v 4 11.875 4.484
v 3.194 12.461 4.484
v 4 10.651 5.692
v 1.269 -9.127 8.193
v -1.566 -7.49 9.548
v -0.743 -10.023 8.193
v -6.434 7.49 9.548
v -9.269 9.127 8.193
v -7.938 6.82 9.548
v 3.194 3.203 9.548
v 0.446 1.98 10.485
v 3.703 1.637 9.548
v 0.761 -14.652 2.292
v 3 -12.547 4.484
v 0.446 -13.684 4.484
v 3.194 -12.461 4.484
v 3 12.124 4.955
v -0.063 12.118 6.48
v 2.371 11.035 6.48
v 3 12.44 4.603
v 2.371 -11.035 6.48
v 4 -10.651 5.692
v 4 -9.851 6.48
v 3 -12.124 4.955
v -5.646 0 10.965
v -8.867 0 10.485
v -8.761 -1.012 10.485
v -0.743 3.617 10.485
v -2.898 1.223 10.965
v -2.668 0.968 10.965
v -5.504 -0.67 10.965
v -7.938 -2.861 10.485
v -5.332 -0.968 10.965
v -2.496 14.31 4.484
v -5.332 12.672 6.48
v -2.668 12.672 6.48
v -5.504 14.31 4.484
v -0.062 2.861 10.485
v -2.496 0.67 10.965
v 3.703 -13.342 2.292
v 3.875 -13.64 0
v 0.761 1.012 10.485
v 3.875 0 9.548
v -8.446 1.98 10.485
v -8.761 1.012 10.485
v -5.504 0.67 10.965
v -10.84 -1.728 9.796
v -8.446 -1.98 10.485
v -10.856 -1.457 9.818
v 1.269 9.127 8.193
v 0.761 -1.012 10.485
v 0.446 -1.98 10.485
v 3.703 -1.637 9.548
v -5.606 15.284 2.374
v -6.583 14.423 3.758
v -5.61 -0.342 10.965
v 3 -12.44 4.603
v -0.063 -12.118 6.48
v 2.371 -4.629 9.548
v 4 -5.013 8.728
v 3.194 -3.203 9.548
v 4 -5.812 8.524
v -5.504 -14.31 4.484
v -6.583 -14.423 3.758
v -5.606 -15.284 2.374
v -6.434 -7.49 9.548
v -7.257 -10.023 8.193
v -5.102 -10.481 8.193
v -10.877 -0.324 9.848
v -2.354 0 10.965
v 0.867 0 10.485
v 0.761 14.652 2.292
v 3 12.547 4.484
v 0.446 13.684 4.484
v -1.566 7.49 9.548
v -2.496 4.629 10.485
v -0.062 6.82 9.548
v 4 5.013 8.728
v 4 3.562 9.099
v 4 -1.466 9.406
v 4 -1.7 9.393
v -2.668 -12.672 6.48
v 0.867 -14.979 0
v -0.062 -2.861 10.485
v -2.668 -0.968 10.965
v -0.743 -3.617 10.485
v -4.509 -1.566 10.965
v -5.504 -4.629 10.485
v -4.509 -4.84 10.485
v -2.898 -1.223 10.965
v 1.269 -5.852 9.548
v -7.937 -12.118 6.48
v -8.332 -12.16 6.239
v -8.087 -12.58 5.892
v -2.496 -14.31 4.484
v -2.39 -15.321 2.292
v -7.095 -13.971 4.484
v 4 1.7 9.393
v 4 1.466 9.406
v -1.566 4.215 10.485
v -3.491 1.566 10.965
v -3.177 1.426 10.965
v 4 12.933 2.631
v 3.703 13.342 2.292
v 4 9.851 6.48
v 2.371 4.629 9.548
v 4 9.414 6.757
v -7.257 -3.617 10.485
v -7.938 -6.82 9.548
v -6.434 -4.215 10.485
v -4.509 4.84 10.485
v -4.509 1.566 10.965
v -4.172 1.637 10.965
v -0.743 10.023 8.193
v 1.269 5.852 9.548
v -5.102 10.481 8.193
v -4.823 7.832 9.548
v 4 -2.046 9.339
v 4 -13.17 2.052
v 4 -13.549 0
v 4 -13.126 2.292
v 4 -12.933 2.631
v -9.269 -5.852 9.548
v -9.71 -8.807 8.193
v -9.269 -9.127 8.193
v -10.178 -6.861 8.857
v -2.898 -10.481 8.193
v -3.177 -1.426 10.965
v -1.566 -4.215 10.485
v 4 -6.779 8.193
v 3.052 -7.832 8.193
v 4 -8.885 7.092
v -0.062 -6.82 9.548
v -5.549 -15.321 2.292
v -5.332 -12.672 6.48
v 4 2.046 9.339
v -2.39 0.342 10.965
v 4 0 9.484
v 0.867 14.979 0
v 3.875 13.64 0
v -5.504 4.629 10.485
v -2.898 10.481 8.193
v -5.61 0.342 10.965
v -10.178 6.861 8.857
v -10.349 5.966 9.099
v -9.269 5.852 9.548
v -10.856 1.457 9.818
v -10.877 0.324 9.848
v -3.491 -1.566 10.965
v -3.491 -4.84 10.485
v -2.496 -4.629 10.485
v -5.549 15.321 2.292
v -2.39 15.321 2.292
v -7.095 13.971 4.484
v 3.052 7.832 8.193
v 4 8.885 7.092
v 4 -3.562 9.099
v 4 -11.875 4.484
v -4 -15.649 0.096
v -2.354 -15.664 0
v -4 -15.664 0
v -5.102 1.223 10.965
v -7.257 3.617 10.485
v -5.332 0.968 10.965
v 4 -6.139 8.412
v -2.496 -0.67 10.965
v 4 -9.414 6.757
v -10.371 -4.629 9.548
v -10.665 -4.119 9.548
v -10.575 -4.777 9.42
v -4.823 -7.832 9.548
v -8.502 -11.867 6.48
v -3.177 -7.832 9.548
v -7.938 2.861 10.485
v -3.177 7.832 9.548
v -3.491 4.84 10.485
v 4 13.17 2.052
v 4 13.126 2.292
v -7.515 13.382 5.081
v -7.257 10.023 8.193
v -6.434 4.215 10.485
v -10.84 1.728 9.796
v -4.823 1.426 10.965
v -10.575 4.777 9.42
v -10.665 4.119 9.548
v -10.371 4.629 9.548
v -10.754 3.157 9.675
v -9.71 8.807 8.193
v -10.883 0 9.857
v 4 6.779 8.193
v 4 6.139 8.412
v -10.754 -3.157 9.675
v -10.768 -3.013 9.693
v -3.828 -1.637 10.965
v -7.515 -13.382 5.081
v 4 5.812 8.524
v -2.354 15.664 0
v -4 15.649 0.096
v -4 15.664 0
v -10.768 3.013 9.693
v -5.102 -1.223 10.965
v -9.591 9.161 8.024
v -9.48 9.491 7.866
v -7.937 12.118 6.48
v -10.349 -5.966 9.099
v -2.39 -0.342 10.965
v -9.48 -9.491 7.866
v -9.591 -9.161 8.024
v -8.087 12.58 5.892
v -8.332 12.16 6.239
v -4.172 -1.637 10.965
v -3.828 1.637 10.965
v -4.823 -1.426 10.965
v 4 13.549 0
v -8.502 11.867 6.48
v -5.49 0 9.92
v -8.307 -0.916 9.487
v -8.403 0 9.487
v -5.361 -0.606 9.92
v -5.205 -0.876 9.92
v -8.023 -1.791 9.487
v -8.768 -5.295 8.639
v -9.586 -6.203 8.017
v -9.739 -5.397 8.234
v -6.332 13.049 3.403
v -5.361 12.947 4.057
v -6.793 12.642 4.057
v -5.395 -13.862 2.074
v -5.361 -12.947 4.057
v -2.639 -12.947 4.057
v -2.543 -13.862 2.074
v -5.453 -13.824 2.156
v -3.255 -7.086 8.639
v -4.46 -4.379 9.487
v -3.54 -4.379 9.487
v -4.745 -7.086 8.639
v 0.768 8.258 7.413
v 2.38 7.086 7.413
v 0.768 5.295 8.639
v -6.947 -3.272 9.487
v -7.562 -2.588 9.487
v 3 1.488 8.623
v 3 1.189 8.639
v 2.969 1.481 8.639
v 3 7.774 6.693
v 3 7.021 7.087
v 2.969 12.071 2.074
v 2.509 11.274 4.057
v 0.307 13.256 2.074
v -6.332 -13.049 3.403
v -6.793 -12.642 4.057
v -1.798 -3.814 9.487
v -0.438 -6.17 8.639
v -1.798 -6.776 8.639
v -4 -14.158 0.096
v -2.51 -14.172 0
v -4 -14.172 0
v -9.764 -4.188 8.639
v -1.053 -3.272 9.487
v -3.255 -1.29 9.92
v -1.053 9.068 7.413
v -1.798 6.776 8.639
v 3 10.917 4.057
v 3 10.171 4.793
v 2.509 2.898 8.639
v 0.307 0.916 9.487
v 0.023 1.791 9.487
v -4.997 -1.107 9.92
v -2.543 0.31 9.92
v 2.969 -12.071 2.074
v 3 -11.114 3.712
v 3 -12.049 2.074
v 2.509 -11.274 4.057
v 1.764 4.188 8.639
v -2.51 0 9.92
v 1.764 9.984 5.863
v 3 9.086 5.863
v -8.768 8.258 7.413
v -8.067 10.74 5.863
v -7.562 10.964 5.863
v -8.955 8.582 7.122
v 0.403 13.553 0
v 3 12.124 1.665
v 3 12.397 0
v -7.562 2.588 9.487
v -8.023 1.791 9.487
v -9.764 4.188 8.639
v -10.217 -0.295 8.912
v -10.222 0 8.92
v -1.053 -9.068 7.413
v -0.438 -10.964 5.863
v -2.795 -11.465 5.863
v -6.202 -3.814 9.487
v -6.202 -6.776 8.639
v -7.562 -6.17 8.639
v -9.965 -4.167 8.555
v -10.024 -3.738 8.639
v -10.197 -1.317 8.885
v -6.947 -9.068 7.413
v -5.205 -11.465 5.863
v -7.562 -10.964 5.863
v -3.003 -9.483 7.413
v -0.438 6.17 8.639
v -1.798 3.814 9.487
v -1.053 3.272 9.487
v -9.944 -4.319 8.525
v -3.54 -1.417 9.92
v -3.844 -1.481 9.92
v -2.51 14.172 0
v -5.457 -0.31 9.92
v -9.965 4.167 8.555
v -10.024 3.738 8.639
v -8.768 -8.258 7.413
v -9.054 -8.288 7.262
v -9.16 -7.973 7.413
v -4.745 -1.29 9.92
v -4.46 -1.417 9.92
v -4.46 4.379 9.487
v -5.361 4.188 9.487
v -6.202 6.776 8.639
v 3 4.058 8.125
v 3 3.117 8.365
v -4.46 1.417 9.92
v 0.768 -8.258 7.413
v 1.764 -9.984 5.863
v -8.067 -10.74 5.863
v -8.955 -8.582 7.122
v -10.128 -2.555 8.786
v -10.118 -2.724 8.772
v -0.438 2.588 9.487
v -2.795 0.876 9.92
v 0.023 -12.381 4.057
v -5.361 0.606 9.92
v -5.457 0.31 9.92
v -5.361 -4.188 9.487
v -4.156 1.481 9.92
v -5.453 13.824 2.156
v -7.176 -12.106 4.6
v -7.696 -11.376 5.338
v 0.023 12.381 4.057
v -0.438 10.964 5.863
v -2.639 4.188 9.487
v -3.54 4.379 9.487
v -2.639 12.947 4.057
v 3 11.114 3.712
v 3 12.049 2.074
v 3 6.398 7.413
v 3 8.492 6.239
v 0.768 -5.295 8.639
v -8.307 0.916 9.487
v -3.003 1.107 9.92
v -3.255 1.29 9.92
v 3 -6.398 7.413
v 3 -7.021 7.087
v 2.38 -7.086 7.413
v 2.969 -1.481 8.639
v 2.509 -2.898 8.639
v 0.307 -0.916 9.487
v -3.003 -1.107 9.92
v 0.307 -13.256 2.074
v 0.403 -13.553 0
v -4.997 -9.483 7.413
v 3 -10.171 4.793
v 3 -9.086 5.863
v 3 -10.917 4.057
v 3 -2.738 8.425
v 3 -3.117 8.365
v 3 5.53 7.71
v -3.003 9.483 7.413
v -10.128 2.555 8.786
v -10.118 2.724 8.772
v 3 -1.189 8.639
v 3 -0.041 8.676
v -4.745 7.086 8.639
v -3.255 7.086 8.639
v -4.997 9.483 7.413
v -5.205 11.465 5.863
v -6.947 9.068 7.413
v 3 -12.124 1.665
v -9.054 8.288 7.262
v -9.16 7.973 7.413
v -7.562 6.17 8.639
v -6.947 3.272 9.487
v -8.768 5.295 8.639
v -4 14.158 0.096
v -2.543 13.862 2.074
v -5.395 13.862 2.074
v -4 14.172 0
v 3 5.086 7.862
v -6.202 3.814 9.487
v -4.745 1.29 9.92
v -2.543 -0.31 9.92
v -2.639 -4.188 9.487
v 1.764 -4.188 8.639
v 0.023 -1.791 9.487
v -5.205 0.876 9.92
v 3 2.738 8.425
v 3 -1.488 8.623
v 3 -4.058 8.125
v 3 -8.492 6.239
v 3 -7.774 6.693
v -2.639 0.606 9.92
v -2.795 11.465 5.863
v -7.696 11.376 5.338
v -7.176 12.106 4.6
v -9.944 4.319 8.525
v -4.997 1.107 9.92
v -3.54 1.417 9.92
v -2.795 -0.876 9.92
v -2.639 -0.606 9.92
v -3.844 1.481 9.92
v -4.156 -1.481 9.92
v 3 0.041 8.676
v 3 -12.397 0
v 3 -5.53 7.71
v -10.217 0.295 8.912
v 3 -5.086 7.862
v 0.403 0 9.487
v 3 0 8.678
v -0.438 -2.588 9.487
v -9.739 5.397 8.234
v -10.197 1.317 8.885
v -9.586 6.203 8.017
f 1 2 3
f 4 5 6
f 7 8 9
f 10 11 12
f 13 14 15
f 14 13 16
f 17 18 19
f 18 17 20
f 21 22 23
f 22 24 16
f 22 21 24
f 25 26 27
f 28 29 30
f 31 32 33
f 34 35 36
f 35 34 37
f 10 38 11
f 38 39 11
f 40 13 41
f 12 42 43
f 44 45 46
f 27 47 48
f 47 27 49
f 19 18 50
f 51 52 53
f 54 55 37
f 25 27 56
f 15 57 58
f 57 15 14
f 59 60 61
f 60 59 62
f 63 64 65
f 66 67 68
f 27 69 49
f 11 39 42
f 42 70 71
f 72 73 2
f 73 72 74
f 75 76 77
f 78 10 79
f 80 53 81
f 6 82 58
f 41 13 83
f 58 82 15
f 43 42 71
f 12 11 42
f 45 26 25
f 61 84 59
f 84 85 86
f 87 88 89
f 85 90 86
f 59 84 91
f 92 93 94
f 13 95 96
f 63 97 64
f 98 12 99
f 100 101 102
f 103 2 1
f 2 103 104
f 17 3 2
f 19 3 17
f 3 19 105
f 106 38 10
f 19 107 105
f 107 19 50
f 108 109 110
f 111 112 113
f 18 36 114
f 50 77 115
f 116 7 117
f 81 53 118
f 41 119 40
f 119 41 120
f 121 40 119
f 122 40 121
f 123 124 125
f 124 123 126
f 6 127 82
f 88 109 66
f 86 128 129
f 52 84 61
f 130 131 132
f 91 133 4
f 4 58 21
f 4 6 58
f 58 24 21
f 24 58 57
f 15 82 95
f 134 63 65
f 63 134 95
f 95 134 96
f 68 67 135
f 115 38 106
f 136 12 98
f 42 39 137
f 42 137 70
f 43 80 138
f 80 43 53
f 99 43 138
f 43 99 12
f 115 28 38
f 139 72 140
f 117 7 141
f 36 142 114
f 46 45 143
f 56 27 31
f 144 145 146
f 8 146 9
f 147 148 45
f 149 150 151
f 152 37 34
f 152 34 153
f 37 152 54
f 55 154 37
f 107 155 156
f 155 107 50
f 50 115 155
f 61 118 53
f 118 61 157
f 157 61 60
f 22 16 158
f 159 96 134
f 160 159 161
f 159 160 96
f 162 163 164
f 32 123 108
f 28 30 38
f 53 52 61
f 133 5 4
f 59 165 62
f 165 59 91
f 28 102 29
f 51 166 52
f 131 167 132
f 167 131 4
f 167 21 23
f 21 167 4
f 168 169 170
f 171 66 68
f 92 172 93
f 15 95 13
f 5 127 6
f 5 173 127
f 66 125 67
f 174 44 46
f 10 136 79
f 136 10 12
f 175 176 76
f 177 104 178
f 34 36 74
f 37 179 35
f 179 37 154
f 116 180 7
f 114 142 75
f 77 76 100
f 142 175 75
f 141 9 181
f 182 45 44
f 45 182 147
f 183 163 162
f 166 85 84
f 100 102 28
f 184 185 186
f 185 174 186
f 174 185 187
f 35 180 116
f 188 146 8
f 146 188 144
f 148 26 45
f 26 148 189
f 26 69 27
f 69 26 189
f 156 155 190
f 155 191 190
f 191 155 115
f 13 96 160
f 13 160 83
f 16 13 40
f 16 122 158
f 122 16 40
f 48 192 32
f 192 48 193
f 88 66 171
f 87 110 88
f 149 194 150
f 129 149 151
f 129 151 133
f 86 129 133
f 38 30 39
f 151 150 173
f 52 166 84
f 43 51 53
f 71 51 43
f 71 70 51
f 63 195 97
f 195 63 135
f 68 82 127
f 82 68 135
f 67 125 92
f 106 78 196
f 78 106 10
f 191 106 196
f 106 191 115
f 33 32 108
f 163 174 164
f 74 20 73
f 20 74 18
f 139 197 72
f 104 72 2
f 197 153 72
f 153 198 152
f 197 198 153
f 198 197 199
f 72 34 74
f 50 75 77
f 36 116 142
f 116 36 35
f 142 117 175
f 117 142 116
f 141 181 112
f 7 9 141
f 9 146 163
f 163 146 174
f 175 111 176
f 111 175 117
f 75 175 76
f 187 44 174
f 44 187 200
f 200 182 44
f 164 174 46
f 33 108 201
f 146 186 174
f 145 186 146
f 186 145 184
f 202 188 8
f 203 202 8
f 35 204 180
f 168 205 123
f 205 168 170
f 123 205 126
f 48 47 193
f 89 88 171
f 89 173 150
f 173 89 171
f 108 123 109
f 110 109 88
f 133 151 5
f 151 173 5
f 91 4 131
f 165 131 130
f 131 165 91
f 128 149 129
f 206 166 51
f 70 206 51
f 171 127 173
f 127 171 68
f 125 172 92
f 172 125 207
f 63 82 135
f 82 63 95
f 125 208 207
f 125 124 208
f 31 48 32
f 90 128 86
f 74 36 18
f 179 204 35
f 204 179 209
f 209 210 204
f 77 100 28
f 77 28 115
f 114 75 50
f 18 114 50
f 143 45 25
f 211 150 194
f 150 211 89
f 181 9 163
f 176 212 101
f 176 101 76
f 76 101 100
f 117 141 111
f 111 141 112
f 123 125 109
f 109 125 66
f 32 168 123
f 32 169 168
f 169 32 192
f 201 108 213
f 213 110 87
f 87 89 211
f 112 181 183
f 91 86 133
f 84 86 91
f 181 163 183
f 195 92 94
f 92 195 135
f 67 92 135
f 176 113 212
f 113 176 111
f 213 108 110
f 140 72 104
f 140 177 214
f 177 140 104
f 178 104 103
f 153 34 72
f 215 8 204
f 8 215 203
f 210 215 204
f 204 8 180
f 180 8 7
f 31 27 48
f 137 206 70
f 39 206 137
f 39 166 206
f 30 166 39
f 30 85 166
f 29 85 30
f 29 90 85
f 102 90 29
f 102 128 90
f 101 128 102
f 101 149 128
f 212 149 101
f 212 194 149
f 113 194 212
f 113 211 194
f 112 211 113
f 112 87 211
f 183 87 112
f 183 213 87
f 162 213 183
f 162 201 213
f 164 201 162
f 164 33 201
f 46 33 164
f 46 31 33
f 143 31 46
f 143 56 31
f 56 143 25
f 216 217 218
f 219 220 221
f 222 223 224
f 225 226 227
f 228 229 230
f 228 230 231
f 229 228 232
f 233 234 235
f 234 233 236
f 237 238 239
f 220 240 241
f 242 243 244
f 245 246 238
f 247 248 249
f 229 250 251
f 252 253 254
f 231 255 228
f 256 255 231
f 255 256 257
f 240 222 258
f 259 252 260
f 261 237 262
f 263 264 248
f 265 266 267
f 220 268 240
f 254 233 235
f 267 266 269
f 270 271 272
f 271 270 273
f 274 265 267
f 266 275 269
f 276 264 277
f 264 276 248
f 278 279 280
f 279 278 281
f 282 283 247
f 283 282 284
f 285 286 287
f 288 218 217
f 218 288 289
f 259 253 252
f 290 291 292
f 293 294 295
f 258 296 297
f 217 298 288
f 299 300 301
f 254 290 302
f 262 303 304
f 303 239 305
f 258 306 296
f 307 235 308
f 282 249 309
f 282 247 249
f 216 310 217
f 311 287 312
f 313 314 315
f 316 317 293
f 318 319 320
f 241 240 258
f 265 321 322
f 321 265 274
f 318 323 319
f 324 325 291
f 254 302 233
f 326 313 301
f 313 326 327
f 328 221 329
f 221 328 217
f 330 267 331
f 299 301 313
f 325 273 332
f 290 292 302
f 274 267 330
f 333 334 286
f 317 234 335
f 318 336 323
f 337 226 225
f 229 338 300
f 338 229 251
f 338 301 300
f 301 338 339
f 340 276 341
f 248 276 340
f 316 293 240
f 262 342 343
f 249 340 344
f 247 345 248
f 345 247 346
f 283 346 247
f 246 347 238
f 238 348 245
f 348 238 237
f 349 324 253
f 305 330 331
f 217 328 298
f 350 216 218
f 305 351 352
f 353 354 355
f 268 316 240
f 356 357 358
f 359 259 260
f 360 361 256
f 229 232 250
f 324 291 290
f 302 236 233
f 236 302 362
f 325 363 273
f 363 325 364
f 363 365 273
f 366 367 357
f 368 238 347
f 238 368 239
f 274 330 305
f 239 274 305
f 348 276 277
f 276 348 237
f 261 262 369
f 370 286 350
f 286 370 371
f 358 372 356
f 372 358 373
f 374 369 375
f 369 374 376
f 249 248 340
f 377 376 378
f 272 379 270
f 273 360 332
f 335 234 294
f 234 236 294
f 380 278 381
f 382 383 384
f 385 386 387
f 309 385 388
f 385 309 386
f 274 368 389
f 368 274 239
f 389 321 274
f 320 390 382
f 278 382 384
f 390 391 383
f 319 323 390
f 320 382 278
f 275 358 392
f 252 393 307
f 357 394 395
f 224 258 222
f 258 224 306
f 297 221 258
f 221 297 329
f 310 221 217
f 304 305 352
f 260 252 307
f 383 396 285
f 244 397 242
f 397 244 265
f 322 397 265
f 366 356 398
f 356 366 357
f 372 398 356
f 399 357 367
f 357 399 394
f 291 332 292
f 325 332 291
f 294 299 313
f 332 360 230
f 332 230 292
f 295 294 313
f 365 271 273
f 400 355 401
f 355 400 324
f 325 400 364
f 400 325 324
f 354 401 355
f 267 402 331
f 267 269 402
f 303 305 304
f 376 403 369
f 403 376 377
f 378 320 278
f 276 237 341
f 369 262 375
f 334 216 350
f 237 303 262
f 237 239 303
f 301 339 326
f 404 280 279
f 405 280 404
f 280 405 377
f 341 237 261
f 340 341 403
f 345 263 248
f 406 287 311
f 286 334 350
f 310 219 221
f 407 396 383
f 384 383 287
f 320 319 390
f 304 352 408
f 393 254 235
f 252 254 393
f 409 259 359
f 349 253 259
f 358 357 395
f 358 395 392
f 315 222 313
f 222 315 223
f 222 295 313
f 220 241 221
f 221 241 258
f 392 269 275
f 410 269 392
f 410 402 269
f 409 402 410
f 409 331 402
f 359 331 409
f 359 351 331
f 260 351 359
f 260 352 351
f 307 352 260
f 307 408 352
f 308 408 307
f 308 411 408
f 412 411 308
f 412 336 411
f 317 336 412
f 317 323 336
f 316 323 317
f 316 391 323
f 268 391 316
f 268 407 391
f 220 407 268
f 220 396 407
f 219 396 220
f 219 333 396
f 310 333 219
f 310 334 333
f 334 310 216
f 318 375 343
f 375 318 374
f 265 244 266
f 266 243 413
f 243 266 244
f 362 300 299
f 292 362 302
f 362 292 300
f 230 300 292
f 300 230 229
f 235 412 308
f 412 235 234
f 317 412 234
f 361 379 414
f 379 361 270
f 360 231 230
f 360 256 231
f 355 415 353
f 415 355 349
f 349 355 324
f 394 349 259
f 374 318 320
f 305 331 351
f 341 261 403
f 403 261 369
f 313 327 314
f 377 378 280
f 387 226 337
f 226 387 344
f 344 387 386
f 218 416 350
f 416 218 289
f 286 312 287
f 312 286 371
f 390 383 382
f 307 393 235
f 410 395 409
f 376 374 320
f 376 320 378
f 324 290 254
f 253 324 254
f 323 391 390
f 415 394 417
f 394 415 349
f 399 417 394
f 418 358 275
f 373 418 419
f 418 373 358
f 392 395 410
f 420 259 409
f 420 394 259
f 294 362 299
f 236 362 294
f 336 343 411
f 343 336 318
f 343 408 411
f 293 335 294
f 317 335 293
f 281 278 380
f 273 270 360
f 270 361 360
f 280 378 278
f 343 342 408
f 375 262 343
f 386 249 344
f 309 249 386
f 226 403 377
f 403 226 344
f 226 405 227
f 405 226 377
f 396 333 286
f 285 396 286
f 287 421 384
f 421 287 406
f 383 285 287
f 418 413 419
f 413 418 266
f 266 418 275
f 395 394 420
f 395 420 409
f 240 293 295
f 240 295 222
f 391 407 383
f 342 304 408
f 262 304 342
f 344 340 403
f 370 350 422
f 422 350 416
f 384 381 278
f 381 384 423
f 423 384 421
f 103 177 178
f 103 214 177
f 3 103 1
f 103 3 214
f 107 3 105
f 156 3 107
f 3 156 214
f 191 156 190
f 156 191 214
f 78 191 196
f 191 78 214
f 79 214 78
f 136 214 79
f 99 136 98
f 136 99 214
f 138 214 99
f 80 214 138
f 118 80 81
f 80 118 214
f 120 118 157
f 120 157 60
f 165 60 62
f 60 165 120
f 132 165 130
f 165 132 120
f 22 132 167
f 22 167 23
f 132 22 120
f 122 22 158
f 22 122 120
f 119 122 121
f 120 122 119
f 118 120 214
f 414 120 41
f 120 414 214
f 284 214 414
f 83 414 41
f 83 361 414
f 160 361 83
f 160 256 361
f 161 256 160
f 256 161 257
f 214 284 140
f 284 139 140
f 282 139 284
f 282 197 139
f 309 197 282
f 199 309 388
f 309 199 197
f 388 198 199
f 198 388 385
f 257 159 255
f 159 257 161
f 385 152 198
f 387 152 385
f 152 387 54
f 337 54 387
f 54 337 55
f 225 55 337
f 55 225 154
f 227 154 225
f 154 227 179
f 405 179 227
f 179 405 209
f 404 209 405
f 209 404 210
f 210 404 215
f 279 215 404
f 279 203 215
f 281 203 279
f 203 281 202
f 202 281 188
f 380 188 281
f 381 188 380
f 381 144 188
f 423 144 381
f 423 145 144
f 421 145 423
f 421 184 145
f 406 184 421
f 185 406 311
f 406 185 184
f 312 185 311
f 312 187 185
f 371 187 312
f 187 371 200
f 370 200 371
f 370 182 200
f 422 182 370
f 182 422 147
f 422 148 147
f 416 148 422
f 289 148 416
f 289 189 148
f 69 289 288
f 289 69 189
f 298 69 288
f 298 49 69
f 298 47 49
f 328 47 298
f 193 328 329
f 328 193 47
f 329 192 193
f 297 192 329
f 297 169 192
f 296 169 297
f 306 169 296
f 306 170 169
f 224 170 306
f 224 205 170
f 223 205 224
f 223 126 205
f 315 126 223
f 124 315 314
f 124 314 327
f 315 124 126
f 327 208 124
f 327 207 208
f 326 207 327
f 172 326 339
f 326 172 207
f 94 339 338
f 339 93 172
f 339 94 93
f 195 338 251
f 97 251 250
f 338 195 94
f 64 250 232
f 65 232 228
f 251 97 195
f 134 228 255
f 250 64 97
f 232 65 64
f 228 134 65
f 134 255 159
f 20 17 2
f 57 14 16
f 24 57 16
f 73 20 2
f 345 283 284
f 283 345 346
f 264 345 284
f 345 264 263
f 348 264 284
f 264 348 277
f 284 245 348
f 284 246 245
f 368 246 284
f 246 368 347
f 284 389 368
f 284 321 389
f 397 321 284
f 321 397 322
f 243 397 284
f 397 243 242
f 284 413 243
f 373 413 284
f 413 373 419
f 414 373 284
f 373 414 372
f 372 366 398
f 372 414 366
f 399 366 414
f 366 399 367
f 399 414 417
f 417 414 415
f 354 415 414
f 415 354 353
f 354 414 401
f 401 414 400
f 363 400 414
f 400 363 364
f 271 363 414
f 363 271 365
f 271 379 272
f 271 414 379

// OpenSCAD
// file: led.scad
module led(height,width){
	cylinder_h=height-width/2;
	translate([0,0,0])
	sphere(width/2);
	translate([-cylinder_h/2,0,0])
	rotate([0,90,0])
	cylinder(h=cylinder_h,r=width/2,center=true);
}
// main file
use <led.scad>;

//$fn=100;
module constraint() {
    intersection(){
        size=15.75;
        union(){
            translate([0, 0, size/2])
                cube(size=[8, size*2, size], center=true);
            translate([-0.75, 0, size/2])
                rotate([0, -40, 0])
                    cube(size=[15, size*2, size], center=true);
        }
        translate([-4.5, 0, size/2])
            cube(size=[17, size*2, size], center=true);
    }
}
module hood(){
scale([1,1,0.7]){
    sphere_translation=-4;
    size=15.75;
    intersection() {
        translate([sphere_translation, 0, 0])
            difference(){
                sphere(size);
                sphere(size-1.5);
            }
            scale([1,1,1.7])
            constraint();
    }
    intersection() {
        translate([sphere_translation, 0, 0])
                sphere(size);
        translate([3.5, 0, size/2])
            cube(size=[1, size*2, size], center=true);
    }
}
}

hood();
